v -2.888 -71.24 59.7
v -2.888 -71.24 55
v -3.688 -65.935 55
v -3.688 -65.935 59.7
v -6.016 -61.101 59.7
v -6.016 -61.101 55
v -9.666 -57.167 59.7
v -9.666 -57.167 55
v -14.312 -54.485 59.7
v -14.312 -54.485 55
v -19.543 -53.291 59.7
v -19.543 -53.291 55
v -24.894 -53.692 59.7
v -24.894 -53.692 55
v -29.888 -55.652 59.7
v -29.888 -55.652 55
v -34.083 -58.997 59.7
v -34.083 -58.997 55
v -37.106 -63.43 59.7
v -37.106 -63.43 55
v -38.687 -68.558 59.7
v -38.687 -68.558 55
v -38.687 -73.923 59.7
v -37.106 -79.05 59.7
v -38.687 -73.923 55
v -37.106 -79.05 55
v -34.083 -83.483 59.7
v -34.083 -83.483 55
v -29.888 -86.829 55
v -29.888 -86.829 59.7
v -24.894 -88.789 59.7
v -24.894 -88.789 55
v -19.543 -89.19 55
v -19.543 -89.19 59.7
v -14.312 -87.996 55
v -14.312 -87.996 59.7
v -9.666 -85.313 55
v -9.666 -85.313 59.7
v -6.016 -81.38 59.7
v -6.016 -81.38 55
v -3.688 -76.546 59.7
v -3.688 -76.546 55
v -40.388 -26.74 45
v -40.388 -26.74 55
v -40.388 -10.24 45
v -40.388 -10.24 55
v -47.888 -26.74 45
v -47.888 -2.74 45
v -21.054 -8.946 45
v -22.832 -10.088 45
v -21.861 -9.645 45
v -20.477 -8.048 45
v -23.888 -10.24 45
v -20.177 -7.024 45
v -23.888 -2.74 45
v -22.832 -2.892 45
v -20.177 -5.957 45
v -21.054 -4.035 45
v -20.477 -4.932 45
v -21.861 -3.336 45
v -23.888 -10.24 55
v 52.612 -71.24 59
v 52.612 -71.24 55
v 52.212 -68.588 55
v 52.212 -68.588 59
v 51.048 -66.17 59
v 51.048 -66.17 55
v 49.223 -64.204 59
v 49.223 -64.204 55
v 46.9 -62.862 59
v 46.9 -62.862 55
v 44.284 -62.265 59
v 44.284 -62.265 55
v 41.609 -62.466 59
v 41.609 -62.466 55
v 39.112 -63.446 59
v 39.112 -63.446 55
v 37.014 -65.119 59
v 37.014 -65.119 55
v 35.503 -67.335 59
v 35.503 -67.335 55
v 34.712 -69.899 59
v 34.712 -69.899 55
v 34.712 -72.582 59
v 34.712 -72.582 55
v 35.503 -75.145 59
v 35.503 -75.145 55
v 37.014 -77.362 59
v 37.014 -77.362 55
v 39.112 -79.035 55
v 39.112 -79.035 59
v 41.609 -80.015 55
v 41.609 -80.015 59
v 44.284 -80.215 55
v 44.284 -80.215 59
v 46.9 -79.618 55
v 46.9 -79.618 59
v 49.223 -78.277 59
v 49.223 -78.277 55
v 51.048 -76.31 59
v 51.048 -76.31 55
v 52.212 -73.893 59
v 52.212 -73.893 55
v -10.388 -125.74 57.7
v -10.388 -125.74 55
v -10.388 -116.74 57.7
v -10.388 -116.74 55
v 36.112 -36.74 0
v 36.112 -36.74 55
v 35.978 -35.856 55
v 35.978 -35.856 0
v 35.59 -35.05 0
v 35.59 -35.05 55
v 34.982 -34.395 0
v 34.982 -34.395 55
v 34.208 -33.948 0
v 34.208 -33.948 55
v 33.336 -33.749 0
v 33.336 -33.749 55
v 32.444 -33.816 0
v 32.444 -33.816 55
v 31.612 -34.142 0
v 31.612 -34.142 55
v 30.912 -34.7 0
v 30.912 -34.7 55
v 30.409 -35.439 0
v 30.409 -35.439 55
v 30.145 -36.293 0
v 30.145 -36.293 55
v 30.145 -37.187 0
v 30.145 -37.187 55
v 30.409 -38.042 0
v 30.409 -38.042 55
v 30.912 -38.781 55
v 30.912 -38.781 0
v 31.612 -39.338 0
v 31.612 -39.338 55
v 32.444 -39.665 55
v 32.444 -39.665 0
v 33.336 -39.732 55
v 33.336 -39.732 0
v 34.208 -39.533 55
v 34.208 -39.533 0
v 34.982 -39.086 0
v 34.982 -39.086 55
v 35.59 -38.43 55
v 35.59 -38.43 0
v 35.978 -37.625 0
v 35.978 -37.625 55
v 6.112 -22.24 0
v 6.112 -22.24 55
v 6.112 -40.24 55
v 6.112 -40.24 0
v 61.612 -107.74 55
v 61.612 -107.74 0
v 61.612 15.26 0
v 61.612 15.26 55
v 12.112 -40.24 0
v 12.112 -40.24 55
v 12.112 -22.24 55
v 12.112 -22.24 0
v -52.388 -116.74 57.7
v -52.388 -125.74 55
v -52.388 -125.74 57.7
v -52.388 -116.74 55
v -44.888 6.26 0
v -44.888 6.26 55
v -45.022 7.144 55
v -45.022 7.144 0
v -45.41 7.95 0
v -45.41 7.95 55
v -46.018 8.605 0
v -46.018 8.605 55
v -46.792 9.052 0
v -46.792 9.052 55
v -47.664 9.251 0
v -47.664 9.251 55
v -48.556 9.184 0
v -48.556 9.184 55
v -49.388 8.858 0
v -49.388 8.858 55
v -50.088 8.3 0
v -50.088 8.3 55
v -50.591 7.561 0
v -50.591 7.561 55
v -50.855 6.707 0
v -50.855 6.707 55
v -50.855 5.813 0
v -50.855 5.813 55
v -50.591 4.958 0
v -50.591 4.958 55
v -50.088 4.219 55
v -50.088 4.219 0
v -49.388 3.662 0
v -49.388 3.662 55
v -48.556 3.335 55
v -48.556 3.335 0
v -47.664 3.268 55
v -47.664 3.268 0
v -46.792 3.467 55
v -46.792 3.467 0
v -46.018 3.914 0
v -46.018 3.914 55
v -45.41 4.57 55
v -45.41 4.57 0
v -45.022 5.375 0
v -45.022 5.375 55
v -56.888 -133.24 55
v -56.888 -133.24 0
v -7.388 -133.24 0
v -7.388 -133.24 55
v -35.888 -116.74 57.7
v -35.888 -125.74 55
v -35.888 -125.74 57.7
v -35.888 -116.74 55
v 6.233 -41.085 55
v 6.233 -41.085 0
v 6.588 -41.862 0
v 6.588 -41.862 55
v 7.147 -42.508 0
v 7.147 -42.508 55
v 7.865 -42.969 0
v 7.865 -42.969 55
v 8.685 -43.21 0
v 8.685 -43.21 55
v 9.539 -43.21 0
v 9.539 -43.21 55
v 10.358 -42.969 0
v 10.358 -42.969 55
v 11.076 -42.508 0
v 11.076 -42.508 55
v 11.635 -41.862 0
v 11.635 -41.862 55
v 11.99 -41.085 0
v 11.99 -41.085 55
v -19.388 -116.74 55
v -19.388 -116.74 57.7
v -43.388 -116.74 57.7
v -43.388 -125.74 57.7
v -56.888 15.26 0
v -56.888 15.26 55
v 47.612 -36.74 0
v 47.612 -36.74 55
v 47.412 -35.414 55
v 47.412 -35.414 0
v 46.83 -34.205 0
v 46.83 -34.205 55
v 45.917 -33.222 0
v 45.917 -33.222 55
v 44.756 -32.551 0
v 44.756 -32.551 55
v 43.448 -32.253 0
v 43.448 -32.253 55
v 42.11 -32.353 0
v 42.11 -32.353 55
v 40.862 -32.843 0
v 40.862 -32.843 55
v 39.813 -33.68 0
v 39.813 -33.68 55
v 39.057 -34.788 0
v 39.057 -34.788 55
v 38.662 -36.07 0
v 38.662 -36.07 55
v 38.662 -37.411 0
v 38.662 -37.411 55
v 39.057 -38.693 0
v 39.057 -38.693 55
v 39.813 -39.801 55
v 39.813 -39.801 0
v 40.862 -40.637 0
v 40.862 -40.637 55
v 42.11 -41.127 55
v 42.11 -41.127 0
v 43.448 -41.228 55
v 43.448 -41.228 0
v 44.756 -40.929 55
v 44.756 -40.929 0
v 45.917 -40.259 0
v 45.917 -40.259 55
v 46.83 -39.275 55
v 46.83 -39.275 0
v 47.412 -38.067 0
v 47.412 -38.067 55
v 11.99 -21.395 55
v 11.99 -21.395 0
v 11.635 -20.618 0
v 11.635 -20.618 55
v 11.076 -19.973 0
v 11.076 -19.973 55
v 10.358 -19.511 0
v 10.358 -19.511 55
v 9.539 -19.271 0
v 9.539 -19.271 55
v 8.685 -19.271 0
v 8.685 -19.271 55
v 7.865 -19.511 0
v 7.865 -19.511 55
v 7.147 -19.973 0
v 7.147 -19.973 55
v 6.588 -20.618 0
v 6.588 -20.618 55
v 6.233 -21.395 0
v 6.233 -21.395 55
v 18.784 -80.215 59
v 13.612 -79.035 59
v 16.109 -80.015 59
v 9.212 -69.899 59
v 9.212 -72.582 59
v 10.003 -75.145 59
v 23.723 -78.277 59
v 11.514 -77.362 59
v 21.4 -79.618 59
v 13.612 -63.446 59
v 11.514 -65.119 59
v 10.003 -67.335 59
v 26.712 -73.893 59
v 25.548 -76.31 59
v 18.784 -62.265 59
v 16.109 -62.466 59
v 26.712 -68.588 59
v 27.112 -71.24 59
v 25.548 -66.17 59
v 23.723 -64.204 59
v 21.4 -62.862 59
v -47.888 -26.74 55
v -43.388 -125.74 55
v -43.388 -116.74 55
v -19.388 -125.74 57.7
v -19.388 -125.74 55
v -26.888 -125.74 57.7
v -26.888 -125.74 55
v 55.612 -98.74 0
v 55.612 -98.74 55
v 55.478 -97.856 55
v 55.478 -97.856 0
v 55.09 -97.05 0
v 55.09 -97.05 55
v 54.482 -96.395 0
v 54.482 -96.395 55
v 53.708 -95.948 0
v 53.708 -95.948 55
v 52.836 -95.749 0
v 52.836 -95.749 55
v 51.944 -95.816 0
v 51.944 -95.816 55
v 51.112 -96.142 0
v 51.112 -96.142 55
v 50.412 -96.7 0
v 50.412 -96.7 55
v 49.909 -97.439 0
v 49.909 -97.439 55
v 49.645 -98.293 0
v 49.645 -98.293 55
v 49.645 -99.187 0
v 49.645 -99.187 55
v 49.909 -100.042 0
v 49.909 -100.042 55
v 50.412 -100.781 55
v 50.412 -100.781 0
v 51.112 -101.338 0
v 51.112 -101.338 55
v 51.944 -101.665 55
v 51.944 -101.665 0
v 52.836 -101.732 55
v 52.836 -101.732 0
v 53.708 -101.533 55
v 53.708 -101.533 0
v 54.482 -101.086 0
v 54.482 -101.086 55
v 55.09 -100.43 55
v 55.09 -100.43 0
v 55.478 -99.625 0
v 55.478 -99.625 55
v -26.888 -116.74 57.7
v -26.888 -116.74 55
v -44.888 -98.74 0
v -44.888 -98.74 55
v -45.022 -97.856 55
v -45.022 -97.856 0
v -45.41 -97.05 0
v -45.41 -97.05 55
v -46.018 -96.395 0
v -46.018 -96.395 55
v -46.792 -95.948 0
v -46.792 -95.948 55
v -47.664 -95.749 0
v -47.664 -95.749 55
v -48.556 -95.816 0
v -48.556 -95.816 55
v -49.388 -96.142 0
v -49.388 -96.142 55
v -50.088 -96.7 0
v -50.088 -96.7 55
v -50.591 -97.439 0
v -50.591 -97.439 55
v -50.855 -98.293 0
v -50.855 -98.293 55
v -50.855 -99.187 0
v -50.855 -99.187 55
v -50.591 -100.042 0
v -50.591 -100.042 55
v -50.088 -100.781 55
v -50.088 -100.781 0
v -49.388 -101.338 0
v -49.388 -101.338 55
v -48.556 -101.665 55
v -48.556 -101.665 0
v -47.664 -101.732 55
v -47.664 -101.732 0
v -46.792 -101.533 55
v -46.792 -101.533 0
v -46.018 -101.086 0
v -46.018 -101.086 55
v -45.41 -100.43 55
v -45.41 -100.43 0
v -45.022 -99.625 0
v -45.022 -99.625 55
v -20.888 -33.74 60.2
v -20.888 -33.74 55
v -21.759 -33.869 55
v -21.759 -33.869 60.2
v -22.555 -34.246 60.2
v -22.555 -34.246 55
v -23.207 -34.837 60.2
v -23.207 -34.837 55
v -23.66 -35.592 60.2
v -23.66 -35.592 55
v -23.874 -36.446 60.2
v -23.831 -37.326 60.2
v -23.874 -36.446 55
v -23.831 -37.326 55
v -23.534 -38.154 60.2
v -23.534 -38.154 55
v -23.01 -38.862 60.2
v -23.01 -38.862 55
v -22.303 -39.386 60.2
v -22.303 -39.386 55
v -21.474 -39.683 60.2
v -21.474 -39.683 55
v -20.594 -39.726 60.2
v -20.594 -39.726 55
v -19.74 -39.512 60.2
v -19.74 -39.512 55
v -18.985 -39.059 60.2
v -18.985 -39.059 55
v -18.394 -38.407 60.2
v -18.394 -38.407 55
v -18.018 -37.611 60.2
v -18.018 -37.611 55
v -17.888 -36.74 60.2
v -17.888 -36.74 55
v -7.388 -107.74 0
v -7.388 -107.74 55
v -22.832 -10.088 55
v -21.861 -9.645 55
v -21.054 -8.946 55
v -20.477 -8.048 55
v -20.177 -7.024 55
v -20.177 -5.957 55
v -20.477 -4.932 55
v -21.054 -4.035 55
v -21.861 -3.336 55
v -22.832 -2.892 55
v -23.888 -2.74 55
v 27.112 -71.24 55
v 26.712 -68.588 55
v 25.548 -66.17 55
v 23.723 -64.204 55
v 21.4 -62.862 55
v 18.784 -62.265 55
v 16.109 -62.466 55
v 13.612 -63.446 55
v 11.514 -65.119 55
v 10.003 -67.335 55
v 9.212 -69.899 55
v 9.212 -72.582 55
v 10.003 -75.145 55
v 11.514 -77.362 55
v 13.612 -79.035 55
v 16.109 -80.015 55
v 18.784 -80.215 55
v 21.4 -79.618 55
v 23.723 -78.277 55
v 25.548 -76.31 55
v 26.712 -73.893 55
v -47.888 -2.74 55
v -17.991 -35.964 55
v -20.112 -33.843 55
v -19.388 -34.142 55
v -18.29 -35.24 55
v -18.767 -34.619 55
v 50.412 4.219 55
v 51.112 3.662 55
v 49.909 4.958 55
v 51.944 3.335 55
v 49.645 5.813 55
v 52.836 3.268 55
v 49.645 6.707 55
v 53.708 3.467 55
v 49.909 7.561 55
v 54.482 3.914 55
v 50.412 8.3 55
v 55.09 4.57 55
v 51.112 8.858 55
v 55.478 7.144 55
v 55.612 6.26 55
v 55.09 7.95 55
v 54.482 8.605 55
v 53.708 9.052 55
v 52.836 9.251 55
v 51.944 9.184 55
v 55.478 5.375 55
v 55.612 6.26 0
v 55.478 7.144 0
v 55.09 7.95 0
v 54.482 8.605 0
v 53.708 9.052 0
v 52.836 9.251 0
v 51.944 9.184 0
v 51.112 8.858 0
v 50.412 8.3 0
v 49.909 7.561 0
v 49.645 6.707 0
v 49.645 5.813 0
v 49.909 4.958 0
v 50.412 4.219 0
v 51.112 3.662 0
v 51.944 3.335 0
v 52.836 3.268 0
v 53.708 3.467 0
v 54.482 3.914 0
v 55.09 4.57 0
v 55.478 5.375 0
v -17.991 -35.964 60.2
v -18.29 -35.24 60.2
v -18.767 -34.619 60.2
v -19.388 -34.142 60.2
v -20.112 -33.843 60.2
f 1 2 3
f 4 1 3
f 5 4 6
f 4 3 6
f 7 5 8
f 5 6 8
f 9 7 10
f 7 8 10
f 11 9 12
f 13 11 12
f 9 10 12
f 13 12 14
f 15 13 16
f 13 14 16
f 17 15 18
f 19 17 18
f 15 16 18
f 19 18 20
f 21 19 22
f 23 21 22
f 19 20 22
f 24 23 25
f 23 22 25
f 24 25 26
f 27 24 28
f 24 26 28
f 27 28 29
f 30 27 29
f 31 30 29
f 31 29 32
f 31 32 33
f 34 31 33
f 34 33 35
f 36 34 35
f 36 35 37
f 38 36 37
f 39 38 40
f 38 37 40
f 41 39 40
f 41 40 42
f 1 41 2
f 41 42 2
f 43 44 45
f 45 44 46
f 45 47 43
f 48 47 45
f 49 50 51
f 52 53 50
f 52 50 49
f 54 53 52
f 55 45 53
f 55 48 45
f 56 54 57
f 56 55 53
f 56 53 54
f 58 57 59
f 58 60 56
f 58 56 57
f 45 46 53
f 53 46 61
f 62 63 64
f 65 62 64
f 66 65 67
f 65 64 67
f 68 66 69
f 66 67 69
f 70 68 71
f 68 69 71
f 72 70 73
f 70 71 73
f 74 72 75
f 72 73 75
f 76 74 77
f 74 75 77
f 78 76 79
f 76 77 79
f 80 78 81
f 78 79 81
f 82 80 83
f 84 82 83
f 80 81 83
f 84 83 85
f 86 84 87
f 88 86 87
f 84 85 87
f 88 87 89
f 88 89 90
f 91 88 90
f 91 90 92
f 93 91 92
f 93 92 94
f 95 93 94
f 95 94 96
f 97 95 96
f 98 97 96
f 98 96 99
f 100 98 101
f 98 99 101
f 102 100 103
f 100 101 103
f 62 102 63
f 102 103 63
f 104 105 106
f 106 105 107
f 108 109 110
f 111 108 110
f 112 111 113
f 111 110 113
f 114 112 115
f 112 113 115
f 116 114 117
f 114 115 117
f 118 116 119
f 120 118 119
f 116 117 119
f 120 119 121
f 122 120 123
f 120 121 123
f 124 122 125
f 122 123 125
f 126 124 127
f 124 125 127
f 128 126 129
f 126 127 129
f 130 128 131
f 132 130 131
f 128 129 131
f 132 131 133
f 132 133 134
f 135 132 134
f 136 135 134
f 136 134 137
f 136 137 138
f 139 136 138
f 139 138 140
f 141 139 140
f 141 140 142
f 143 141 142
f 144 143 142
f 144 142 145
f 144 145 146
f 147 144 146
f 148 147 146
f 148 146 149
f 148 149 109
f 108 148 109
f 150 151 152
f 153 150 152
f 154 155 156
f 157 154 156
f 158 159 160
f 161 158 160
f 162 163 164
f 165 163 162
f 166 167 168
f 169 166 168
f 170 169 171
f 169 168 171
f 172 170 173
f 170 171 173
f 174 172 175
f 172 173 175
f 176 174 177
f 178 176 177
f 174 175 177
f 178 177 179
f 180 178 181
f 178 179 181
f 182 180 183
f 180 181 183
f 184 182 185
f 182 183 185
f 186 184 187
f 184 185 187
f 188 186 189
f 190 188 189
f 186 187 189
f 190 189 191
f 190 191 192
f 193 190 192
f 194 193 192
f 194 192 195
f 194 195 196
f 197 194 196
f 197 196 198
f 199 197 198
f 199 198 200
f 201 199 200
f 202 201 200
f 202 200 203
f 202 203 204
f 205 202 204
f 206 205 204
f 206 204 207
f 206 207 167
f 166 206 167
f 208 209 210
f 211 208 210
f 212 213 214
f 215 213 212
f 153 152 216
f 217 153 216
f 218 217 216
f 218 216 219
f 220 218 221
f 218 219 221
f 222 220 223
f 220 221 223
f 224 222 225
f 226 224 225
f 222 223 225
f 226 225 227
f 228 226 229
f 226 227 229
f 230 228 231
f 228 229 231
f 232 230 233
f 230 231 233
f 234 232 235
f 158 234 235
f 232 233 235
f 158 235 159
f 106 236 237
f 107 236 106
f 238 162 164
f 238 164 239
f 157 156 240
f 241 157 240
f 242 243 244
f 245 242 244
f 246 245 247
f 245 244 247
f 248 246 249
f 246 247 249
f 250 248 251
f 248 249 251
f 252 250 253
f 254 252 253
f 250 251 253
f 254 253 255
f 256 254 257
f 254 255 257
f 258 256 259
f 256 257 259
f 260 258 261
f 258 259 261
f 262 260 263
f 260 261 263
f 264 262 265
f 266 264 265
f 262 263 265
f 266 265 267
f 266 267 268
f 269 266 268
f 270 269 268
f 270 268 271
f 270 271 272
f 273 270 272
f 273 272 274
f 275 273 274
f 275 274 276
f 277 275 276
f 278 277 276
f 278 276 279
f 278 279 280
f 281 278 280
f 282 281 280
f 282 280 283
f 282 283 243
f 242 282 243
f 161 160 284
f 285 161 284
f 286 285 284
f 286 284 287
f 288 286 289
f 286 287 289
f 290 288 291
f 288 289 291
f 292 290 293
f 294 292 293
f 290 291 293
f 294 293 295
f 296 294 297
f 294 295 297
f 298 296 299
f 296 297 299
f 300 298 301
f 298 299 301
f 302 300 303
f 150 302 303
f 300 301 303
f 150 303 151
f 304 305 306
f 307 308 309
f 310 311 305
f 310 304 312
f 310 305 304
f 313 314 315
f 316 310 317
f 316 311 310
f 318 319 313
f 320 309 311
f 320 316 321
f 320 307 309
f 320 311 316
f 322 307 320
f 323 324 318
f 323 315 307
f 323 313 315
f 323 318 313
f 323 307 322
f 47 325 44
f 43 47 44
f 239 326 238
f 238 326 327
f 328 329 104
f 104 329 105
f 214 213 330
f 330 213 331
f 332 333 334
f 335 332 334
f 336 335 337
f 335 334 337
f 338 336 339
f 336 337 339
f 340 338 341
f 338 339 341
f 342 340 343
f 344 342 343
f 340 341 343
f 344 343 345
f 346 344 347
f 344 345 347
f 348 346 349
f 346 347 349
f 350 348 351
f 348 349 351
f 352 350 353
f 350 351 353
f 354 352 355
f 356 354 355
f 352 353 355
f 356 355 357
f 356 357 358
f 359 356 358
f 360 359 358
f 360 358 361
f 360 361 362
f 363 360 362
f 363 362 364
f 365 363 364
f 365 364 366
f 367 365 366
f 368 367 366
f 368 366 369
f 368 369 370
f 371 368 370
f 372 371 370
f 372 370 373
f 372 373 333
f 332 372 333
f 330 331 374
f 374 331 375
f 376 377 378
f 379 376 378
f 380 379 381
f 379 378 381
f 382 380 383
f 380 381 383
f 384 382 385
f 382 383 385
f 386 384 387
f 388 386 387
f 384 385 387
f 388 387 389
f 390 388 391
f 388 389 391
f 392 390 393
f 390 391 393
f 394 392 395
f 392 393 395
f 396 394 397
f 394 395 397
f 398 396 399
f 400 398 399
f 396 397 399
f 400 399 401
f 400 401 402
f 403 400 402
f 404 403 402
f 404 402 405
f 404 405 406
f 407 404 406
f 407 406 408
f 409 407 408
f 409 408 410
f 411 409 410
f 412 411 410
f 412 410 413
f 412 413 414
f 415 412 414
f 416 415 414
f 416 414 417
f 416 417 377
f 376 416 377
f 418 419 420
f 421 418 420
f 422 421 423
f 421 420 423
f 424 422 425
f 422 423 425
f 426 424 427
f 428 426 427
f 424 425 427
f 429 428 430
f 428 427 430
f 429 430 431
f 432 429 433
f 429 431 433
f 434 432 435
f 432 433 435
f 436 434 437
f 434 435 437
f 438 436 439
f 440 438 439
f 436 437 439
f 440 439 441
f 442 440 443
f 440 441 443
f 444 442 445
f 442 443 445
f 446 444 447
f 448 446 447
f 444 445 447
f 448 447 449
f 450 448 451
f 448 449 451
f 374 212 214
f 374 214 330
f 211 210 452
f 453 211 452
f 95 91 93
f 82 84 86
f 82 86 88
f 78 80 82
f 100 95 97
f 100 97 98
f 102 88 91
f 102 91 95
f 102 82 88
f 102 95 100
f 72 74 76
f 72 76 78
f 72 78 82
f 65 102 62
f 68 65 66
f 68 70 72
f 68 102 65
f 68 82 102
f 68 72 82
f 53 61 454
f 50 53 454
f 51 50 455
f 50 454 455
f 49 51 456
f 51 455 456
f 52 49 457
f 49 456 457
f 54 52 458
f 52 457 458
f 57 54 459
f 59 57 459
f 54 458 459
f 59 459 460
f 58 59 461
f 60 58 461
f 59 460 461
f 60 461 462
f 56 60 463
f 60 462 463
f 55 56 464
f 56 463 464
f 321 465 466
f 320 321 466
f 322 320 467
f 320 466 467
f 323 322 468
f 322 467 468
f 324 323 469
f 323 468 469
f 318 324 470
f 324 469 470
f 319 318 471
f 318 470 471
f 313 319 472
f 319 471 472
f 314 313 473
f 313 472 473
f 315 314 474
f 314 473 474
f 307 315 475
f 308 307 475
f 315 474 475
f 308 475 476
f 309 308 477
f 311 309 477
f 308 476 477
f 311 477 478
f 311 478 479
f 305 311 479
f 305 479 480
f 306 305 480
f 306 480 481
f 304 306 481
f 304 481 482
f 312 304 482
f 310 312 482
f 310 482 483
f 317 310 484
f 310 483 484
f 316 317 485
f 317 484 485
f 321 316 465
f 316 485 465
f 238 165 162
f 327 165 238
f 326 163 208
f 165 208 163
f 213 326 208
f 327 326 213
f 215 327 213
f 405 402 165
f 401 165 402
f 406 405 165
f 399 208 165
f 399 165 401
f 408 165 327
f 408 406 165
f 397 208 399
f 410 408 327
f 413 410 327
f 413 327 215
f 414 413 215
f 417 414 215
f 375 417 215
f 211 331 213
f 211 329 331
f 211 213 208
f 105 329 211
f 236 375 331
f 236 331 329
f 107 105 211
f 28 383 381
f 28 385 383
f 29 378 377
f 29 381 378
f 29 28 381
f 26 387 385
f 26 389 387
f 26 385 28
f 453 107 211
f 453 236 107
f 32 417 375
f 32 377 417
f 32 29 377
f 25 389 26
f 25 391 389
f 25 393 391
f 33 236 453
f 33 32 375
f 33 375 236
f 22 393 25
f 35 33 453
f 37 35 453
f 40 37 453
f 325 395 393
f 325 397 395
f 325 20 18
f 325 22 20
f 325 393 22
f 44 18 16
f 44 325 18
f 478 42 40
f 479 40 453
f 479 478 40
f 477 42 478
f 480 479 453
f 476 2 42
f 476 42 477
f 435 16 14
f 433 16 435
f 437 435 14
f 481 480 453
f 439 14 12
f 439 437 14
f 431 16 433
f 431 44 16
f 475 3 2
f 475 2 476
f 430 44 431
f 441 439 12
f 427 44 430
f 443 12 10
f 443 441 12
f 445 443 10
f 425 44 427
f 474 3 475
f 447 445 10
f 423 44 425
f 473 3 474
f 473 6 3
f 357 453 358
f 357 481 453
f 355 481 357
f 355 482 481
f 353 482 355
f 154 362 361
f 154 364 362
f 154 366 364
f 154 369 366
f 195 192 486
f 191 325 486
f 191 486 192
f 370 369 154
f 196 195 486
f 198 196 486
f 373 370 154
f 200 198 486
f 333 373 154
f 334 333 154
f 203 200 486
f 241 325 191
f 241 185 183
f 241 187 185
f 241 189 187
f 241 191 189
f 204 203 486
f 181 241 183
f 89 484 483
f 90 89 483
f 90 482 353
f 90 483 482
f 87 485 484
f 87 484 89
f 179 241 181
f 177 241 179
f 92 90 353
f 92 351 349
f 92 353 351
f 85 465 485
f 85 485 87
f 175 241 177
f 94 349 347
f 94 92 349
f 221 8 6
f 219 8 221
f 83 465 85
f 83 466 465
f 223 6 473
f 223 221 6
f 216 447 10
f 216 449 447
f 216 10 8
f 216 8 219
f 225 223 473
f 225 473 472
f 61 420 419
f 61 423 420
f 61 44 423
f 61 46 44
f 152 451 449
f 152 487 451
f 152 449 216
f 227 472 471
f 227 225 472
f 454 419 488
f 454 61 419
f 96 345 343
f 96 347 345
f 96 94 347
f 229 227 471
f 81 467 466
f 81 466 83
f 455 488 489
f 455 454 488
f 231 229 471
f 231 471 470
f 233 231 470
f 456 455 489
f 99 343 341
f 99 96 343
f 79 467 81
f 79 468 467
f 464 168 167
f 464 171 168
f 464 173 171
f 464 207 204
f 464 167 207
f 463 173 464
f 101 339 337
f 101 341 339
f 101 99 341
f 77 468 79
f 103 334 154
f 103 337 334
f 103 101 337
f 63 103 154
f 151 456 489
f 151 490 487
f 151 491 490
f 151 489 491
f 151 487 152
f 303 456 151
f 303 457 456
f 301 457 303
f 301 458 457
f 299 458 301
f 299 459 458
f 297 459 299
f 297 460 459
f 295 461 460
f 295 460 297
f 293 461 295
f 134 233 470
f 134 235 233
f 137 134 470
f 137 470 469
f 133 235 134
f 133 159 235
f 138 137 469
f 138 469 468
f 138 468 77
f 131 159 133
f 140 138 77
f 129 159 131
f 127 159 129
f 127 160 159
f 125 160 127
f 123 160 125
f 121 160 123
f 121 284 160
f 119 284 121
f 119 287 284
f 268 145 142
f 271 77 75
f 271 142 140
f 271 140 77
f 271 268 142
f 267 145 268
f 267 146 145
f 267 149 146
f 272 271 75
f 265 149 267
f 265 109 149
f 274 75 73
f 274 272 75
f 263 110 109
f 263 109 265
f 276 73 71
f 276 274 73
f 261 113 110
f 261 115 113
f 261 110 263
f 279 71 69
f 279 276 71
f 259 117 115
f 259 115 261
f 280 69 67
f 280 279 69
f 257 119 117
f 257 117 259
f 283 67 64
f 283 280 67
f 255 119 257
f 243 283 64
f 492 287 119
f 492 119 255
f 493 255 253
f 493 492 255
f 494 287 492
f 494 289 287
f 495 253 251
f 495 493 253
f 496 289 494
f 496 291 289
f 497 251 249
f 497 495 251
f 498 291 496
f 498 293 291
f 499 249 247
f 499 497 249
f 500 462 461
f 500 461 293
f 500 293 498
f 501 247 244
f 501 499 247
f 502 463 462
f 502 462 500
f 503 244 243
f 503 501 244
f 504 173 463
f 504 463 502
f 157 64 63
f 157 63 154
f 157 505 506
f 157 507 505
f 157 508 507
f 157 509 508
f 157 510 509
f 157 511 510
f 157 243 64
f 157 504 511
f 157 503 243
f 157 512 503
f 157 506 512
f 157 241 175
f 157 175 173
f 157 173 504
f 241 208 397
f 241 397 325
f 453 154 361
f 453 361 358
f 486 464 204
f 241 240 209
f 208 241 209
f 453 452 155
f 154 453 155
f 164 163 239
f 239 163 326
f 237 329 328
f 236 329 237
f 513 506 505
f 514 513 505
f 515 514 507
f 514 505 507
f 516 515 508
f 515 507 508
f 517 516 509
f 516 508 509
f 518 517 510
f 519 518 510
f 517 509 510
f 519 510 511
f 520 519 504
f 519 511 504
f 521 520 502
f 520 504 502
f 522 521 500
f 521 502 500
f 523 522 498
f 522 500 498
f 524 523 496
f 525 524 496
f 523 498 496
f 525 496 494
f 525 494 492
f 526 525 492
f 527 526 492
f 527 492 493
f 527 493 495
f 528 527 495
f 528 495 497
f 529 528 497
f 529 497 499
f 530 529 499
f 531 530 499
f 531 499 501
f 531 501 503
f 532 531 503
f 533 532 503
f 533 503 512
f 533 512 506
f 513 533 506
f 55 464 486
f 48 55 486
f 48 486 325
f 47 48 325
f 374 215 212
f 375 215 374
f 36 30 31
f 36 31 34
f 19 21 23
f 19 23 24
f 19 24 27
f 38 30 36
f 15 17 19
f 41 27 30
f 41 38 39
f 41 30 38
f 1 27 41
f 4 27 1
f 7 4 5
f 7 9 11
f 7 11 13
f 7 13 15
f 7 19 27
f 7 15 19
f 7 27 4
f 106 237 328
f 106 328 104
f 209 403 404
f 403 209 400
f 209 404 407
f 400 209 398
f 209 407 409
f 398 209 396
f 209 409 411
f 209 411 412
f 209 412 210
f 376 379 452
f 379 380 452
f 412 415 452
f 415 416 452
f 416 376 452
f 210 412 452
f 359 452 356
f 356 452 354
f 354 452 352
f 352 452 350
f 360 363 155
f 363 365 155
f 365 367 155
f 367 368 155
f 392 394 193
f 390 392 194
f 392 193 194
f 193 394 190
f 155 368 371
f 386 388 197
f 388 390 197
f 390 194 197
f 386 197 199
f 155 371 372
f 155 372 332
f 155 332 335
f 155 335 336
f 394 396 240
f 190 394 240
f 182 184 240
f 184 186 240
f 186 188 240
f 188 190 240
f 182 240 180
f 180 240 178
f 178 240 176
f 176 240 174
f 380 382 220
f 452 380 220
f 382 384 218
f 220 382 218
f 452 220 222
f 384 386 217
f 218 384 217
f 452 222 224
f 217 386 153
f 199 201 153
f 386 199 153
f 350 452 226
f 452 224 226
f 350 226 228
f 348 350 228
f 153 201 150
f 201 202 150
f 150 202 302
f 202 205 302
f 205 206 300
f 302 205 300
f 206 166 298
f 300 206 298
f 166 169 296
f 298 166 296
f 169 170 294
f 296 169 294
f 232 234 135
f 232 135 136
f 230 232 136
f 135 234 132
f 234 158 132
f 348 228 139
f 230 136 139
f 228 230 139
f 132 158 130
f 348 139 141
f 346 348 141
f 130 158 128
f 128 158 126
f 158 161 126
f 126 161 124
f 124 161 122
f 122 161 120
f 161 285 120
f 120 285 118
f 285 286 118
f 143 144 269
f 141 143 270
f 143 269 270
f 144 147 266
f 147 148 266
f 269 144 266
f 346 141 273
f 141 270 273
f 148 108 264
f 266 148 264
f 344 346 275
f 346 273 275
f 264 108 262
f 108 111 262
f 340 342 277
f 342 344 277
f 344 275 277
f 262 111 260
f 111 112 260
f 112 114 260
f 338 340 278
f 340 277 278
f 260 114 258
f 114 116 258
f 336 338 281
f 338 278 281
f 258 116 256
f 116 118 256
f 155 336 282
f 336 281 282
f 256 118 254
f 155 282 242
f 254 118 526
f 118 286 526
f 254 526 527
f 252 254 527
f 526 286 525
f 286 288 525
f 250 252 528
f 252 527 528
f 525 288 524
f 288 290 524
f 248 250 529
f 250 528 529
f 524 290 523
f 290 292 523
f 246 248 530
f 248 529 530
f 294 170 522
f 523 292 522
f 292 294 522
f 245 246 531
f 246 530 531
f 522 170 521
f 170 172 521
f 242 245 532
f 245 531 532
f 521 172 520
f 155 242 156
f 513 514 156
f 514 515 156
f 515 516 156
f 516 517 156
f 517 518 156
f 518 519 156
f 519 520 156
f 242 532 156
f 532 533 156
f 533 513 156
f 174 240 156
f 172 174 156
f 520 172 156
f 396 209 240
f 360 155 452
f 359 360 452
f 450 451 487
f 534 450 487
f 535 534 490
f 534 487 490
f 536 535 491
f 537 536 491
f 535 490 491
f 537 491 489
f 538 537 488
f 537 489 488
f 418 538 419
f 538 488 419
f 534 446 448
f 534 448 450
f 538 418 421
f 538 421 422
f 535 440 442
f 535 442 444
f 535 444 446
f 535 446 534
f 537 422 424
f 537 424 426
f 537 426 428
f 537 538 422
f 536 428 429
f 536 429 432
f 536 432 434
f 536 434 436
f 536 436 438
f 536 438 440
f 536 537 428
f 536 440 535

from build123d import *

# Parameters (mm, degrees)
F1_DEPTH  = 55
F2_R      = 3
F3_DEPTH  = 55.001
F4_R      = 18
F5_DEPTH  = 4.7
F6_R      = 9
F7_DEPTH  = 4
F9_DEPTH  = 55.001
F10_R     = 3
F10_R_2   = 4.5
F11_DEPTH = 55.001
F13_DEPTH = 10
F15_DEPTH = 5.2
F16_W     = 9
F16_H     = 9
F17_DEPTH = 2.7


with BuildPart() as f1:
    # F0 (on Top) → F1 (new body)
    with BuildSketch(Plane.XY):
        Polygon((61.611576, 15.259703), (-56.888424, 15.259703), (-56.888424, -133.240297), (-7.388424, -133.240297), (-7.388424, -107.740297), (61.611576, -107.740297), align=None)
    extrude(amount=F1_DEPTH)

    # F2 (on face) → F3 (cut, through all)
    with BuildSketch(Plane.XY.offset(55)):
        with Locations((-47.888424, -98.740297)):
            Circle(F2_R)
        with Locations((52.611576, -98.740297)):
            Circle(F2_R)
        with BuildLine():
            ThreePointArc((49.611576, 6.259703), (52.611576, 3.259703), (55.611576, 6.259703))
            ThreePointArc((55.611576, 6.259703), (52.611576, 9.259703), (49.611576, 6.259703))
        make_face()
        with Locations((-47.888424, 6.259703)):
            Circle(F2_R)
    extrude(amount=-F3_DEPTH, mode=Mode.SUBTRACT)

    # F4 (on face) → F5 (join)
    with BuildSketch(Plane.XY.offset(55)):
        with Locations((-20.888424, -71.240297)):
            Circle(F4_R)
    extrude(amount=F5_DEPTH)

    # F6 (on face) → F7 (join)
    with BuildSketch(Plane.XY.offset(55)):
        with Locations((18.111576, -71.240297)):
            Circle(F6_R)
        with Locations((43.611576, -71.240297)):
            Circle(F6_R)
    extrude(amount=F7_DEPTH)

    # F8 (on face) → F9 (cut, through all)
    with BuildSketch(Plane.XY.offset(55)):
        with BuildLine():
            Line((12.111576, -40.240297), (12.111576, -22.240297))
            ThreePointArc((12.111576, -22.240297), (9.111576, -19.240297), (6.111576, -22.240297))
            Line((6.111576, -22.240297), (6.111576, -40.240297))
            ThreePointArc((6.111576, -40.240297), (9.111576, -43.240297), (12.111576, -40.240297))
        make_face()
    extrude(amount=-F9_DEPTH, mode=Mode.SUBTRACT)

    # F10 (on face) → F11 (cut, through all)
    with BuildSketch(Plane.XY.offset(55)):
        with Locations((33.111576, -36.740297)):
            Circle(F10_R)
        with Locations((43.111576, -36.740297)):
            Circle(F10_R_2)
    extrude(amount=-F11_DEPTH, mode=Mode.SUBTRACT)

    # F12 (on face) → F13 (cut)
    with BuildSketch(Plane.XY.offset(55)):
        with BuildLine():
            Line((-23.888424, -2.740297), (-47.888424, -2.740297))
            Line((-47.888424, -2.740297), (-47.888424, -26.740297))
            Line((-47.888424, -26.740297), (-40.388424, -26.740297))
            Line((-40.388424, -26.740297), (-40.388424, -10.240297))
            Line((-40.388424, -10.240297), (-23.888424, -10.240297))
            ThreePointArc((-23.888424, -10.240297), (-20.138424, -6.490297), (-23.888424, -2.740297))
        make_face()
    extrude(amount=-F13_DEPTH, mode=Mode.SUBTRACT)

    # F14 (on face) → F15 (join)
    with BuildSketch(Plane.XY.offset(55)):
        with BuildLine():
            ThreePointArc((-20.888424, -33.740297), (-23.009744, -38.861618), (-17.888424, -36.740297))
            ThreePointArc((-17.888424, -36.740297), (-18.767104, -34.618977), (-20.888424, -33.740297))
        make_face()
    extrude(amount=F15_DEPTH)

    # F16 (on face) → F17 (join)
    with BuildSketch(Plane.XY.offset(55)):
        with Locations((-47.888424, -121.240297)):
            Rectangle(F16_W, F16_H)
        with Locations((-31.388424, -121.240297)):
            Rectangle(F16_W, F16_H)
        with Locations((-14.888424, -121.240297)):
            Rectangle(F16_W, F16_H)
    extrude(amount=F17_DEPTH)


solid = f1.part
